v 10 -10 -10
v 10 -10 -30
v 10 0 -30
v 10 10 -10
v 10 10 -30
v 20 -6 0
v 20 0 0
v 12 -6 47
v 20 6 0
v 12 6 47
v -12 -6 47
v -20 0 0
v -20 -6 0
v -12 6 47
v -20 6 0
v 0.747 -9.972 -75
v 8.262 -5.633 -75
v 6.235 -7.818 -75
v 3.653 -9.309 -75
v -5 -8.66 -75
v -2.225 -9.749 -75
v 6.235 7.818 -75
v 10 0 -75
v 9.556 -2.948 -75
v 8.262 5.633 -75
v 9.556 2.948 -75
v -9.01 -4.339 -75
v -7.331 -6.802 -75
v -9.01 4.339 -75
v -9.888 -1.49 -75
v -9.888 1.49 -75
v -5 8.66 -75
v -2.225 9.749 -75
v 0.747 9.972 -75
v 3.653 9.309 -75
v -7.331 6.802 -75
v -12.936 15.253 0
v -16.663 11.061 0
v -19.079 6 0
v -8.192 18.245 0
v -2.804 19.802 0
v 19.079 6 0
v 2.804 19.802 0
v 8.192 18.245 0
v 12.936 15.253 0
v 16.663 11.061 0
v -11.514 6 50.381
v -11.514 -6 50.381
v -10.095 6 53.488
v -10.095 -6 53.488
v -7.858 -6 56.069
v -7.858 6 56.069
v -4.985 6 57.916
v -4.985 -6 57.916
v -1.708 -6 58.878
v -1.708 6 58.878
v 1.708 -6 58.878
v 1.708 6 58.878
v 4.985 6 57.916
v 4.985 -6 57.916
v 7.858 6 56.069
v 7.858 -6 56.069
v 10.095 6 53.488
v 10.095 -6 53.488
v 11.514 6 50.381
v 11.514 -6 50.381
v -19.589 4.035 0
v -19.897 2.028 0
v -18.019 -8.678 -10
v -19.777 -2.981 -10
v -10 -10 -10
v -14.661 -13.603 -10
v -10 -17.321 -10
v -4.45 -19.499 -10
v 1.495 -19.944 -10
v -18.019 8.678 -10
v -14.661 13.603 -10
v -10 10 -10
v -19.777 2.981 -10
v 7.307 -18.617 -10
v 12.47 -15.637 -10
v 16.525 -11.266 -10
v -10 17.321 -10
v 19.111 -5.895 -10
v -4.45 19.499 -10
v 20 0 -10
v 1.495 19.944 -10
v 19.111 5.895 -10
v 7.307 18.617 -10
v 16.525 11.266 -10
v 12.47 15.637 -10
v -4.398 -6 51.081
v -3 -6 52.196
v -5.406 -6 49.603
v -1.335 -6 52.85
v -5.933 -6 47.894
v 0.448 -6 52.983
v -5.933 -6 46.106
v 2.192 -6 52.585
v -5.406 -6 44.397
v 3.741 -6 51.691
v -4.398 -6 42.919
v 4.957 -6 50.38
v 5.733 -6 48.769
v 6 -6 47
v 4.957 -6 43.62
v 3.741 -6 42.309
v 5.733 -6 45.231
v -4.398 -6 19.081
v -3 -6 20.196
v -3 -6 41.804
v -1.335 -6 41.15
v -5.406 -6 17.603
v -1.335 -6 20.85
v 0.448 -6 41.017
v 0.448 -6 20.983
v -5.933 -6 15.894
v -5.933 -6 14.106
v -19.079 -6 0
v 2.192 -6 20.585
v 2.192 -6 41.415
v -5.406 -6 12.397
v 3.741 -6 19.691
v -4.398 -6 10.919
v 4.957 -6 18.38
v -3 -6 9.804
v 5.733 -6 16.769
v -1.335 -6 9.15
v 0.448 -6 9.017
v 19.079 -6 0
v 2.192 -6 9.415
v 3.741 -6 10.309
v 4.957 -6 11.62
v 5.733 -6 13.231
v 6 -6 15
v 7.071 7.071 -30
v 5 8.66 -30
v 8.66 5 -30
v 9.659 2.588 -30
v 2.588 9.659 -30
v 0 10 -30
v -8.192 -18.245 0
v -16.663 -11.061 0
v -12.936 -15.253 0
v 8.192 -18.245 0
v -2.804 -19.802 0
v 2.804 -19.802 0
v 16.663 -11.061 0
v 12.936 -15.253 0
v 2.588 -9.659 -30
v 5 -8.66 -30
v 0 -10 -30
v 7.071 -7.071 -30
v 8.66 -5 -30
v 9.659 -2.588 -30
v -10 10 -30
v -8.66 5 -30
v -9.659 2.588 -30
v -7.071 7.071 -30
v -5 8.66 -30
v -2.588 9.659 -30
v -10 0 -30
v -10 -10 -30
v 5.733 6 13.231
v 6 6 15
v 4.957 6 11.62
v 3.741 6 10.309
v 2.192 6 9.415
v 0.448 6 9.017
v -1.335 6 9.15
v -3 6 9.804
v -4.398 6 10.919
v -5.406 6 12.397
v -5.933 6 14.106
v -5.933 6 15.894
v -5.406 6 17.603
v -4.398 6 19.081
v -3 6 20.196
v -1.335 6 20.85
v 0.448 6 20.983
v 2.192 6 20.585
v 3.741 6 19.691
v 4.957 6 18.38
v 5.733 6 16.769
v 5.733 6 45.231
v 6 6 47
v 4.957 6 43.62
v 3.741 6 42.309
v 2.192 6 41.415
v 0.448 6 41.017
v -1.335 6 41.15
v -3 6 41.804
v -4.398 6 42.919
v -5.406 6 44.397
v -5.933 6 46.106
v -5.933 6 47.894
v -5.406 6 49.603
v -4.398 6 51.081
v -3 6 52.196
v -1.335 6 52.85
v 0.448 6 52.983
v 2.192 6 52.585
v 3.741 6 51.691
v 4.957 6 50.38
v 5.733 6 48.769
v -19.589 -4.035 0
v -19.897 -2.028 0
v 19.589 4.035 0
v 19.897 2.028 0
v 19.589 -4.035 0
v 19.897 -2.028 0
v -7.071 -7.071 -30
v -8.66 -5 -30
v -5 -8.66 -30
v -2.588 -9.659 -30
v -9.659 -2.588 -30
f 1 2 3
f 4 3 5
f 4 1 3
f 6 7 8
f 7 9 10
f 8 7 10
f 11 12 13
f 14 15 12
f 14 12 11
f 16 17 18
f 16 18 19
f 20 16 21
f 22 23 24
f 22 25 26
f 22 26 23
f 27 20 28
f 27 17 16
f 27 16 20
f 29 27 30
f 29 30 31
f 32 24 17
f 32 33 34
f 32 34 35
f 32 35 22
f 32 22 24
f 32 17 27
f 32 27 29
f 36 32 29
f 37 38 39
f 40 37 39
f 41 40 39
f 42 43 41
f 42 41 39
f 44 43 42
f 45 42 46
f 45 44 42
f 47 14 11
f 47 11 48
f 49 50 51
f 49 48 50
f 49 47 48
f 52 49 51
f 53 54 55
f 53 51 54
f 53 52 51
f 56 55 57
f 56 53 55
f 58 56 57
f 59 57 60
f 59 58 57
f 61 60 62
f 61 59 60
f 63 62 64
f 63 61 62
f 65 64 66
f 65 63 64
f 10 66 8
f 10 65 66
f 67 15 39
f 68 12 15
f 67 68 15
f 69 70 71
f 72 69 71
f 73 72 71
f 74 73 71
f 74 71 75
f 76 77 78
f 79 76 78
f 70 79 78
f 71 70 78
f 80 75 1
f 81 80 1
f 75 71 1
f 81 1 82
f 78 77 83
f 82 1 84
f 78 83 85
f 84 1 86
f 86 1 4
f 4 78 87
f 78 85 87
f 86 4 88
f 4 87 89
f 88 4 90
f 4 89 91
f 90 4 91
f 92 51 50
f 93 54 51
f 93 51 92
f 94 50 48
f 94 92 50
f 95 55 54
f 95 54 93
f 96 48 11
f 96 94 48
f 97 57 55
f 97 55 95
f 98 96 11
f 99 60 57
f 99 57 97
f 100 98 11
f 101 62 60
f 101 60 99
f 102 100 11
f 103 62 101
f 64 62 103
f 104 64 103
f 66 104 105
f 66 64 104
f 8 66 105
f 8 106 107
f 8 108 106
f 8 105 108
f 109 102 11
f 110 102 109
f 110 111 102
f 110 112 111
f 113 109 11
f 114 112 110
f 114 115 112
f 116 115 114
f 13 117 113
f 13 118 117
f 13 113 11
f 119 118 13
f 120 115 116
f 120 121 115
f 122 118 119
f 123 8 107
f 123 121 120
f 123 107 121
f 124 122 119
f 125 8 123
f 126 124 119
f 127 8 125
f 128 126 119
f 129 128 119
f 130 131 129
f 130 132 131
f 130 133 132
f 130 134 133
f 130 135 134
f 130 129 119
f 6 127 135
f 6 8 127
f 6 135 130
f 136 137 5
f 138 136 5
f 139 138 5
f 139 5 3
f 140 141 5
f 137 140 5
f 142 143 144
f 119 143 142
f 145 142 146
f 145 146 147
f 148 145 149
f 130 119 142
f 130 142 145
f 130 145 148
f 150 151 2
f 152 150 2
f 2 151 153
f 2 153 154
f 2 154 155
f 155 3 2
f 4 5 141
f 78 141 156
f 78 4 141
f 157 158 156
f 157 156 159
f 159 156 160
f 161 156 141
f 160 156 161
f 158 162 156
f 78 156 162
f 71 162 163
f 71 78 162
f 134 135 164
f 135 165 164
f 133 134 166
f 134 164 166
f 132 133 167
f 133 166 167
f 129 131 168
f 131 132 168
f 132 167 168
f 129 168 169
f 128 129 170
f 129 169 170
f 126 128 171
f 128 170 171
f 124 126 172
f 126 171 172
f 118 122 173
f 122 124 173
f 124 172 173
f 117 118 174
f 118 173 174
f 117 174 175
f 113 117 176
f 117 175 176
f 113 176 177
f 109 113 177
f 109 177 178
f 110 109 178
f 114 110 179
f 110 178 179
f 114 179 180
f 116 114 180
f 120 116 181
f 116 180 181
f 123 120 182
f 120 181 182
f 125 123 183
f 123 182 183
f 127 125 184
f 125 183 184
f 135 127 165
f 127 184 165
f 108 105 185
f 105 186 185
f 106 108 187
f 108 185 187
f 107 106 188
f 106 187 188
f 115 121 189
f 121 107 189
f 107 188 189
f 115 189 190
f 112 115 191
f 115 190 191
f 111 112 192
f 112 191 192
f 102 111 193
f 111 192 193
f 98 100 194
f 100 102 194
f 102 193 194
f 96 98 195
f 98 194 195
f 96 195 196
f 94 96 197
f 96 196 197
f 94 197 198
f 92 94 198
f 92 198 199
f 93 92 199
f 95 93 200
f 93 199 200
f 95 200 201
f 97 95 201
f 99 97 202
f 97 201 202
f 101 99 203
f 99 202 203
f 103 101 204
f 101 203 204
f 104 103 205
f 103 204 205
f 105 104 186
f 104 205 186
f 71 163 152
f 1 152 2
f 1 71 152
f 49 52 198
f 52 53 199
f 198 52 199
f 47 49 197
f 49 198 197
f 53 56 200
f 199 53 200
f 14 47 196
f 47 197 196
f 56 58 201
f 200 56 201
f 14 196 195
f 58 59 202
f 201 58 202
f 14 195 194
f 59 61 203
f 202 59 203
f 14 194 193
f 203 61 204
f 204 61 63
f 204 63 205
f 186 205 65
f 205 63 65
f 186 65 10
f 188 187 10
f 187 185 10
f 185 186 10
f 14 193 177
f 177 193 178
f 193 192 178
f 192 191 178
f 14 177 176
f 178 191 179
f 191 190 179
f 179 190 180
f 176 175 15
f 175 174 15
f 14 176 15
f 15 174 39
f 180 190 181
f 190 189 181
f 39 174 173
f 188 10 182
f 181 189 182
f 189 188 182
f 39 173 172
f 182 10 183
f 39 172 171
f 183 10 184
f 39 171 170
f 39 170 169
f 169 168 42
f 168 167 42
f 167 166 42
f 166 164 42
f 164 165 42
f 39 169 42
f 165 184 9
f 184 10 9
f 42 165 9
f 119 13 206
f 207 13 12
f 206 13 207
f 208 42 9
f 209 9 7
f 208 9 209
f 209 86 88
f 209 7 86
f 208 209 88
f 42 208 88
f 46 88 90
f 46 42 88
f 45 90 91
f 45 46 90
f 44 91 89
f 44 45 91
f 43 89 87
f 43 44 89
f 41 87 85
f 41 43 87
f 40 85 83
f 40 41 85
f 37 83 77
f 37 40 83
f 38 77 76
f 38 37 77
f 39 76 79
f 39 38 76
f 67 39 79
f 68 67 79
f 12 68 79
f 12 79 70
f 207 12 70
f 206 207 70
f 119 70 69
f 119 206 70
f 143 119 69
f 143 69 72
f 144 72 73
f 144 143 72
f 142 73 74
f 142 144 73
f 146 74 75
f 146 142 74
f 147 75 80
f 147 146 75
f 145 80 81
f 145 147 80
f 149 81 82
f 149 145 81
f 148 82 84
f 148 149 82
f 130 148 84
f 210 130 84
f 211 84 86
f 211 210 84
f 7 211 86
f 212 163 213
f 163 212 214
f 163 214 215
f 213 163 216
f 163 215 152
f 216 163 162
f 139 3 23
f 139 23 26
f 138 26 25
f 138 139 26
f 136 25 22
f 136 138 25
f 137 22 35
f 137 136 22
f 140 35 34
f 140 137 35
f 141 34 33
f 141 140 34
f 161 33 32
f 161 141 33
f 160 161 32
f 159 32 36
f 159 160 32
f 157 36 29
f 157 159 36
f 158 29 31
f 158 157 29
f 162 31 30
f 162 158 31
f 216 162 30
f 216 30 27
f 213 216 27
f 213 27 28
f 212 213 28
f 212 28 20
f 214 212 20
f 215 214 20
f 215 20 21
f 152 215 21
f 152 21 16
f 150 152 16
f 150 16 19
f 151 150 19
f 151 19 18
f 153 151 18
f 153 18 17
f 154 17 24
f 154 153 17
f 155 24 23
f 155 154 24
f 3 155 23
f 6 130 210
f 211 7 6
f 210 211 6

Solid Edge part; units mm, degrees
sketch "Sketch1" plane through (0, 0, 0) normal (0, -1, 0) x (1, 0, 0)
  circle A0 centre (0, 47) radius 6
  line L0 (-20, 0) -> (20, 0)
  line L1 (20, 0) -> (12, 47)
  line L2 (-20, 0) -> (-12, 47)
  arc A1 (12, 47) -> (-12, 47) centre (0, 47) ccw
  circle A2 centre (0, 15) radius 6
  dimension "D1" = 15
  dimension "D2" = 32
  dimension "D3" = 40
  dimension "D4" = 12
  dimension "D5" = 12
  dimension "D6" = 12
extrude "Protrusion1" add sketch "Sketch1" along normal mid plane 12
sketch "Sketch2" plane through (0, 0, 0) normal (0, 0, 1) x (1, 0, 0)
  circle A0 centre (0, 0) radius 20
extrude "ExtrudedProtrusion_6" add sketch "Sketch2" against normal blind 10
sketch "Sketch3" plane through (0, 0, -10) normal (0, 0, -1) x (1, 0, 0)
  line L0 (-10, 10) -> (10, 10)
  line L1 (10, 10) -> (10, -10)
  line L2 (10, -10) -> (-10, -10)
  line L3 (-10, -10) -> (-10, 10)
  dimension "D1" = 20
  dimension "D2" = 20
extrude "ExtrudedProtrusion_7" add sketch "Sketch3" along normal blind 20
sketch "Sketch4" plane through (0, 0, -30) normal (0, 0, -1) x (1, 0, 0)
  circle A0 centre (0, 0) radius 10
extrude "ExtrudedProtrusion_8" add sketch "Sketch4" along normal blind 45
cosmetic_thread "Thread1" size "Tr 20 x 4"
properties part number "3" material "Fe 410 W"
